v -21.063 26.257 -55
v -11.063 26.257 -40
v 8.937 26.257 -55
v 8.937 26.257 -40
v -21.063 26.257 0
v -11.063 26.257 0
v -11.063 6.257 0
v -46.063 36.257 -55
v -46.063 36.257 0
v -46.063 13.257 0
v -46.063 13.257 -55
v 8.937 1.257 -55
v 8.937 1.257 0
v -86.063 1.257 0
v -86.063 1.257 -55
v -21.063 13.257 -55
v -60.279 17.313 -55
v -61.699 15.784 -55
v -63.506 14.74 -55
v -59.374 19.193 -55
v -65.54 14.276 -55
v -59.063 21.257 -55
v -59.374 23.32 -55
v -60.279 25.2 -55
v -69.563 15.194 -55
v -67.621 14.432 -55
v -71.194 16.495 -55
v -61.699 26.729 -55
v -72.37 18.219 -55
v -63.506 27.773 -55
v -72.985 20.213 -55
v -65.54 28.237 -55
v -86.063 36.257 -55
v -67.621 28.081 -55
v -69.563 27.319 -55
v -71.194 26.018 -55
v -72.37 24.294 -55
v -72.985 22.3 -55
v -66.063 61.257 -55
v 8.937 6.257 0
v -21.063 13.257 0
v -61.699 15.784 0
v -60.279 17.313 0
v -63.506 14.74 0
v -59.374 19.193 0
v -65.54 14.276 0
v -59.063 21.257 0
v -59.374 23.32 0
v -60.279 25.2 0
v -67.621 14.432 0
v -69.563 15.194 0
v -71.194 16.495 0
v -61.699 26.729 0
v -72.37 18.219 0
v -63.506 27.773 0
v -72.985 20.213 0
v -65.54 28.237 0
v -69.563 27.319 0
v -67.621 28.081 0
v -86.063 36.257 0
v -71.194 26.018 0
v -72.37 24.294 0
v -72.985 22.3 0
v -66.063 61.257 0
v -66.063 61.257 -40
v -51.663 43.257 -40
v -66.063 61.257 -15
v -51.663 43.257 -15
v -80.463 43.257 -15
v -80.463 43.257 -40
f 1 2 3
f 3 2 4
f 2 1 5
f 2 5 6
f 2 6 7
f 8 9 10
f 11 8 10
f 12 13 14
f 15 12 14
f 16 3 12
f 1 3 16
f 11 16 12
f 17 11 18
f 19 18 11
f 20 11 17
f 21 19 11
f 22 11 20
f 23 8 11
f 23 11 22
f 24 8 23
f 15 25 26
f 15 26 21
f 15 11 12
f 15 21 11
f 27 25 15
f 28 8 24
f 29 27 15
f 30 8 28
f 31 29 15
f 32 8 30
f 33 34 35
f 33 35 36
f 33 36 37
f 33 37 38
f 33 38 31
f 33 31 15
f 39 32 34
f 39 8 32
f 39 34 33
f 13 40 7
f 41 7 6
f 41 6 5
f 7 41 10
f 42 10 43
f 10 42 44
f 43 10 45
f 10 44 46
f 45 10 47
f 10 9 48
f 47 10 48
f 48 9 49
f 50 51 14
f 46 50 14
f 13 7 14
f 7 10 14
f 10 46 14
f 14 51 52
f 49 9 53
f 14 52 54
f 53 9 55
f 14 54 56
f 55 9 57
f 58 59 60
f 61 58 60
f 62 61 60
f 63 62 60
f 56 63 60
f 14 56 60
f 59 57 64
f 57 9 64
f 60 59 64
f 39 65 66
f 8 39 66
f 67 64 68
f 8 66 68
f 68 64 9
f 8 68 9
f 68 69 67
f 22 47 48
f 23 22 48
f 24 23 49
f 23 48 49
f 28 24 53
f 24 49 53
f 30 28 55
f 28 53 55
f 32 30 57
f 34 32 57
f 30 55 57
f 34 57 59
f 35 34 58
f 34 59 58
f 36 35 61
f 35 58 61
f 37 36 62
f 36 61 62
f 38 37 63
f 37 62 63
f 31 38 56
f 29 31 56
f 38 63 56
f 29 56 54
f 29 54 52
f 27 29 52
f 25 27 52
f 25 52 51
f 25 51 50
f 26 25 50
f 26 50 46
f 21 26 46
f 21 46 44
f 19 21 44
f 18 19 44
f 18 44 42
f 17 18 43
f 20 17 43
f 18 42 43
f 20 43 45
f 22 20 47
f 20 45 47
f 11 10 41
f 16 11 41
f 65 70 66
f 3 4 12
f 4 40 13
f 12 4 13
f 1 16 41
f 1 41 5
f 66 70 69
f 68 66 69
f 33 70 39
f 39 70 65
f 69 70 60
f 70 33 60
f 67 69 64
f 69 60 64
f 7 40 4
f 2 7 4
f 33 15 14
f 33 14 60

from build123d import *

# Parameters (mm, degrees)
ESBO_O1_R                = 7
RESSALTO_EXTRUS_O1_DEPTH = 55
CORTE_EXTRUS_O1_REACH    = 127.707
ESBO_O2_W                = 25
ESBO_O2_H                = 18
CORTE_EXTRUS_O2_DEPTH    = 20


with BuildPart() as part:
    # Esboço1 → Ressalto-extrusão1 (new body)
    with BuildSketch(Plane.XY):
        Polygon((-86.062995877, 1.256505599), (-86.062995877, 36.256505599), (-66.062995877, 61.256505599), (-46.062995877, 36.256505599), (-46.062995877, 13.256505599), (-21.062995877, 13.256505599), (-21.062995877, 26.256505599), (8.937004123, 26.256505599), (8.937004123, 1.256505599), align=None)
        with Locations((-66.062995877, 21.256505599)):
            Circle(ESBO_O1_R, mode=Mode.SUBTRACT)
    extrude(amount=-RESSALTO_EXTRUS_O1_DEPTH)

    # Corte-extrusão1: up to this plane
    corte_extrus_o1_end = Plane(origin=(-66.062995877, 61.256505599, -55), z_dir=(0.7808688094430304, 0.6246950475544243, 0))
    # Esboço2 → Corte-extrusão1 (cut, up to the surface)
    with BuildSketch(Plane.ZY.offset(86.062995877), mode=Mode.PRIVATE) as corte_extrus_o1_sk1:
        with Locations((-27.5, 52.256505599)):
            Rectangle(ESBO_O2_W, ESBO_O2_H)
    corte_extrus_o1_tool1 = split(extrude(corte_extrus_o1_sk1.sketch, amount=-CORTE_EXTRUS_O1_REACH, mode=Mode.PRIVATE), bisect_by=corte_extrus_o1_end, keep=Keep.BOTH, mode=Mode.PRIVATE)
    add(corte_extrus_o1_tool1.solids().sort_by_distance((-86.062996, 52.256506, -27.5))[0], mode=Mode.SUBTRACT)

    # Esboço3 → Corte-extrusão2 (cut)
    with BuildSketch(Plane(origin=(8.937004123, 0, 0), x_dir=(0, 0, -1), z_dir=(1, 0, 0))):
        Polygon((0, 6.256505599), (40, 26.256505599), (0, 26.256505599), align=None)
    extrude(amount=-CORTE_EXTRUS_O2_DEPTH, mode=Mode.SUBTRACT)


solid = part.part
